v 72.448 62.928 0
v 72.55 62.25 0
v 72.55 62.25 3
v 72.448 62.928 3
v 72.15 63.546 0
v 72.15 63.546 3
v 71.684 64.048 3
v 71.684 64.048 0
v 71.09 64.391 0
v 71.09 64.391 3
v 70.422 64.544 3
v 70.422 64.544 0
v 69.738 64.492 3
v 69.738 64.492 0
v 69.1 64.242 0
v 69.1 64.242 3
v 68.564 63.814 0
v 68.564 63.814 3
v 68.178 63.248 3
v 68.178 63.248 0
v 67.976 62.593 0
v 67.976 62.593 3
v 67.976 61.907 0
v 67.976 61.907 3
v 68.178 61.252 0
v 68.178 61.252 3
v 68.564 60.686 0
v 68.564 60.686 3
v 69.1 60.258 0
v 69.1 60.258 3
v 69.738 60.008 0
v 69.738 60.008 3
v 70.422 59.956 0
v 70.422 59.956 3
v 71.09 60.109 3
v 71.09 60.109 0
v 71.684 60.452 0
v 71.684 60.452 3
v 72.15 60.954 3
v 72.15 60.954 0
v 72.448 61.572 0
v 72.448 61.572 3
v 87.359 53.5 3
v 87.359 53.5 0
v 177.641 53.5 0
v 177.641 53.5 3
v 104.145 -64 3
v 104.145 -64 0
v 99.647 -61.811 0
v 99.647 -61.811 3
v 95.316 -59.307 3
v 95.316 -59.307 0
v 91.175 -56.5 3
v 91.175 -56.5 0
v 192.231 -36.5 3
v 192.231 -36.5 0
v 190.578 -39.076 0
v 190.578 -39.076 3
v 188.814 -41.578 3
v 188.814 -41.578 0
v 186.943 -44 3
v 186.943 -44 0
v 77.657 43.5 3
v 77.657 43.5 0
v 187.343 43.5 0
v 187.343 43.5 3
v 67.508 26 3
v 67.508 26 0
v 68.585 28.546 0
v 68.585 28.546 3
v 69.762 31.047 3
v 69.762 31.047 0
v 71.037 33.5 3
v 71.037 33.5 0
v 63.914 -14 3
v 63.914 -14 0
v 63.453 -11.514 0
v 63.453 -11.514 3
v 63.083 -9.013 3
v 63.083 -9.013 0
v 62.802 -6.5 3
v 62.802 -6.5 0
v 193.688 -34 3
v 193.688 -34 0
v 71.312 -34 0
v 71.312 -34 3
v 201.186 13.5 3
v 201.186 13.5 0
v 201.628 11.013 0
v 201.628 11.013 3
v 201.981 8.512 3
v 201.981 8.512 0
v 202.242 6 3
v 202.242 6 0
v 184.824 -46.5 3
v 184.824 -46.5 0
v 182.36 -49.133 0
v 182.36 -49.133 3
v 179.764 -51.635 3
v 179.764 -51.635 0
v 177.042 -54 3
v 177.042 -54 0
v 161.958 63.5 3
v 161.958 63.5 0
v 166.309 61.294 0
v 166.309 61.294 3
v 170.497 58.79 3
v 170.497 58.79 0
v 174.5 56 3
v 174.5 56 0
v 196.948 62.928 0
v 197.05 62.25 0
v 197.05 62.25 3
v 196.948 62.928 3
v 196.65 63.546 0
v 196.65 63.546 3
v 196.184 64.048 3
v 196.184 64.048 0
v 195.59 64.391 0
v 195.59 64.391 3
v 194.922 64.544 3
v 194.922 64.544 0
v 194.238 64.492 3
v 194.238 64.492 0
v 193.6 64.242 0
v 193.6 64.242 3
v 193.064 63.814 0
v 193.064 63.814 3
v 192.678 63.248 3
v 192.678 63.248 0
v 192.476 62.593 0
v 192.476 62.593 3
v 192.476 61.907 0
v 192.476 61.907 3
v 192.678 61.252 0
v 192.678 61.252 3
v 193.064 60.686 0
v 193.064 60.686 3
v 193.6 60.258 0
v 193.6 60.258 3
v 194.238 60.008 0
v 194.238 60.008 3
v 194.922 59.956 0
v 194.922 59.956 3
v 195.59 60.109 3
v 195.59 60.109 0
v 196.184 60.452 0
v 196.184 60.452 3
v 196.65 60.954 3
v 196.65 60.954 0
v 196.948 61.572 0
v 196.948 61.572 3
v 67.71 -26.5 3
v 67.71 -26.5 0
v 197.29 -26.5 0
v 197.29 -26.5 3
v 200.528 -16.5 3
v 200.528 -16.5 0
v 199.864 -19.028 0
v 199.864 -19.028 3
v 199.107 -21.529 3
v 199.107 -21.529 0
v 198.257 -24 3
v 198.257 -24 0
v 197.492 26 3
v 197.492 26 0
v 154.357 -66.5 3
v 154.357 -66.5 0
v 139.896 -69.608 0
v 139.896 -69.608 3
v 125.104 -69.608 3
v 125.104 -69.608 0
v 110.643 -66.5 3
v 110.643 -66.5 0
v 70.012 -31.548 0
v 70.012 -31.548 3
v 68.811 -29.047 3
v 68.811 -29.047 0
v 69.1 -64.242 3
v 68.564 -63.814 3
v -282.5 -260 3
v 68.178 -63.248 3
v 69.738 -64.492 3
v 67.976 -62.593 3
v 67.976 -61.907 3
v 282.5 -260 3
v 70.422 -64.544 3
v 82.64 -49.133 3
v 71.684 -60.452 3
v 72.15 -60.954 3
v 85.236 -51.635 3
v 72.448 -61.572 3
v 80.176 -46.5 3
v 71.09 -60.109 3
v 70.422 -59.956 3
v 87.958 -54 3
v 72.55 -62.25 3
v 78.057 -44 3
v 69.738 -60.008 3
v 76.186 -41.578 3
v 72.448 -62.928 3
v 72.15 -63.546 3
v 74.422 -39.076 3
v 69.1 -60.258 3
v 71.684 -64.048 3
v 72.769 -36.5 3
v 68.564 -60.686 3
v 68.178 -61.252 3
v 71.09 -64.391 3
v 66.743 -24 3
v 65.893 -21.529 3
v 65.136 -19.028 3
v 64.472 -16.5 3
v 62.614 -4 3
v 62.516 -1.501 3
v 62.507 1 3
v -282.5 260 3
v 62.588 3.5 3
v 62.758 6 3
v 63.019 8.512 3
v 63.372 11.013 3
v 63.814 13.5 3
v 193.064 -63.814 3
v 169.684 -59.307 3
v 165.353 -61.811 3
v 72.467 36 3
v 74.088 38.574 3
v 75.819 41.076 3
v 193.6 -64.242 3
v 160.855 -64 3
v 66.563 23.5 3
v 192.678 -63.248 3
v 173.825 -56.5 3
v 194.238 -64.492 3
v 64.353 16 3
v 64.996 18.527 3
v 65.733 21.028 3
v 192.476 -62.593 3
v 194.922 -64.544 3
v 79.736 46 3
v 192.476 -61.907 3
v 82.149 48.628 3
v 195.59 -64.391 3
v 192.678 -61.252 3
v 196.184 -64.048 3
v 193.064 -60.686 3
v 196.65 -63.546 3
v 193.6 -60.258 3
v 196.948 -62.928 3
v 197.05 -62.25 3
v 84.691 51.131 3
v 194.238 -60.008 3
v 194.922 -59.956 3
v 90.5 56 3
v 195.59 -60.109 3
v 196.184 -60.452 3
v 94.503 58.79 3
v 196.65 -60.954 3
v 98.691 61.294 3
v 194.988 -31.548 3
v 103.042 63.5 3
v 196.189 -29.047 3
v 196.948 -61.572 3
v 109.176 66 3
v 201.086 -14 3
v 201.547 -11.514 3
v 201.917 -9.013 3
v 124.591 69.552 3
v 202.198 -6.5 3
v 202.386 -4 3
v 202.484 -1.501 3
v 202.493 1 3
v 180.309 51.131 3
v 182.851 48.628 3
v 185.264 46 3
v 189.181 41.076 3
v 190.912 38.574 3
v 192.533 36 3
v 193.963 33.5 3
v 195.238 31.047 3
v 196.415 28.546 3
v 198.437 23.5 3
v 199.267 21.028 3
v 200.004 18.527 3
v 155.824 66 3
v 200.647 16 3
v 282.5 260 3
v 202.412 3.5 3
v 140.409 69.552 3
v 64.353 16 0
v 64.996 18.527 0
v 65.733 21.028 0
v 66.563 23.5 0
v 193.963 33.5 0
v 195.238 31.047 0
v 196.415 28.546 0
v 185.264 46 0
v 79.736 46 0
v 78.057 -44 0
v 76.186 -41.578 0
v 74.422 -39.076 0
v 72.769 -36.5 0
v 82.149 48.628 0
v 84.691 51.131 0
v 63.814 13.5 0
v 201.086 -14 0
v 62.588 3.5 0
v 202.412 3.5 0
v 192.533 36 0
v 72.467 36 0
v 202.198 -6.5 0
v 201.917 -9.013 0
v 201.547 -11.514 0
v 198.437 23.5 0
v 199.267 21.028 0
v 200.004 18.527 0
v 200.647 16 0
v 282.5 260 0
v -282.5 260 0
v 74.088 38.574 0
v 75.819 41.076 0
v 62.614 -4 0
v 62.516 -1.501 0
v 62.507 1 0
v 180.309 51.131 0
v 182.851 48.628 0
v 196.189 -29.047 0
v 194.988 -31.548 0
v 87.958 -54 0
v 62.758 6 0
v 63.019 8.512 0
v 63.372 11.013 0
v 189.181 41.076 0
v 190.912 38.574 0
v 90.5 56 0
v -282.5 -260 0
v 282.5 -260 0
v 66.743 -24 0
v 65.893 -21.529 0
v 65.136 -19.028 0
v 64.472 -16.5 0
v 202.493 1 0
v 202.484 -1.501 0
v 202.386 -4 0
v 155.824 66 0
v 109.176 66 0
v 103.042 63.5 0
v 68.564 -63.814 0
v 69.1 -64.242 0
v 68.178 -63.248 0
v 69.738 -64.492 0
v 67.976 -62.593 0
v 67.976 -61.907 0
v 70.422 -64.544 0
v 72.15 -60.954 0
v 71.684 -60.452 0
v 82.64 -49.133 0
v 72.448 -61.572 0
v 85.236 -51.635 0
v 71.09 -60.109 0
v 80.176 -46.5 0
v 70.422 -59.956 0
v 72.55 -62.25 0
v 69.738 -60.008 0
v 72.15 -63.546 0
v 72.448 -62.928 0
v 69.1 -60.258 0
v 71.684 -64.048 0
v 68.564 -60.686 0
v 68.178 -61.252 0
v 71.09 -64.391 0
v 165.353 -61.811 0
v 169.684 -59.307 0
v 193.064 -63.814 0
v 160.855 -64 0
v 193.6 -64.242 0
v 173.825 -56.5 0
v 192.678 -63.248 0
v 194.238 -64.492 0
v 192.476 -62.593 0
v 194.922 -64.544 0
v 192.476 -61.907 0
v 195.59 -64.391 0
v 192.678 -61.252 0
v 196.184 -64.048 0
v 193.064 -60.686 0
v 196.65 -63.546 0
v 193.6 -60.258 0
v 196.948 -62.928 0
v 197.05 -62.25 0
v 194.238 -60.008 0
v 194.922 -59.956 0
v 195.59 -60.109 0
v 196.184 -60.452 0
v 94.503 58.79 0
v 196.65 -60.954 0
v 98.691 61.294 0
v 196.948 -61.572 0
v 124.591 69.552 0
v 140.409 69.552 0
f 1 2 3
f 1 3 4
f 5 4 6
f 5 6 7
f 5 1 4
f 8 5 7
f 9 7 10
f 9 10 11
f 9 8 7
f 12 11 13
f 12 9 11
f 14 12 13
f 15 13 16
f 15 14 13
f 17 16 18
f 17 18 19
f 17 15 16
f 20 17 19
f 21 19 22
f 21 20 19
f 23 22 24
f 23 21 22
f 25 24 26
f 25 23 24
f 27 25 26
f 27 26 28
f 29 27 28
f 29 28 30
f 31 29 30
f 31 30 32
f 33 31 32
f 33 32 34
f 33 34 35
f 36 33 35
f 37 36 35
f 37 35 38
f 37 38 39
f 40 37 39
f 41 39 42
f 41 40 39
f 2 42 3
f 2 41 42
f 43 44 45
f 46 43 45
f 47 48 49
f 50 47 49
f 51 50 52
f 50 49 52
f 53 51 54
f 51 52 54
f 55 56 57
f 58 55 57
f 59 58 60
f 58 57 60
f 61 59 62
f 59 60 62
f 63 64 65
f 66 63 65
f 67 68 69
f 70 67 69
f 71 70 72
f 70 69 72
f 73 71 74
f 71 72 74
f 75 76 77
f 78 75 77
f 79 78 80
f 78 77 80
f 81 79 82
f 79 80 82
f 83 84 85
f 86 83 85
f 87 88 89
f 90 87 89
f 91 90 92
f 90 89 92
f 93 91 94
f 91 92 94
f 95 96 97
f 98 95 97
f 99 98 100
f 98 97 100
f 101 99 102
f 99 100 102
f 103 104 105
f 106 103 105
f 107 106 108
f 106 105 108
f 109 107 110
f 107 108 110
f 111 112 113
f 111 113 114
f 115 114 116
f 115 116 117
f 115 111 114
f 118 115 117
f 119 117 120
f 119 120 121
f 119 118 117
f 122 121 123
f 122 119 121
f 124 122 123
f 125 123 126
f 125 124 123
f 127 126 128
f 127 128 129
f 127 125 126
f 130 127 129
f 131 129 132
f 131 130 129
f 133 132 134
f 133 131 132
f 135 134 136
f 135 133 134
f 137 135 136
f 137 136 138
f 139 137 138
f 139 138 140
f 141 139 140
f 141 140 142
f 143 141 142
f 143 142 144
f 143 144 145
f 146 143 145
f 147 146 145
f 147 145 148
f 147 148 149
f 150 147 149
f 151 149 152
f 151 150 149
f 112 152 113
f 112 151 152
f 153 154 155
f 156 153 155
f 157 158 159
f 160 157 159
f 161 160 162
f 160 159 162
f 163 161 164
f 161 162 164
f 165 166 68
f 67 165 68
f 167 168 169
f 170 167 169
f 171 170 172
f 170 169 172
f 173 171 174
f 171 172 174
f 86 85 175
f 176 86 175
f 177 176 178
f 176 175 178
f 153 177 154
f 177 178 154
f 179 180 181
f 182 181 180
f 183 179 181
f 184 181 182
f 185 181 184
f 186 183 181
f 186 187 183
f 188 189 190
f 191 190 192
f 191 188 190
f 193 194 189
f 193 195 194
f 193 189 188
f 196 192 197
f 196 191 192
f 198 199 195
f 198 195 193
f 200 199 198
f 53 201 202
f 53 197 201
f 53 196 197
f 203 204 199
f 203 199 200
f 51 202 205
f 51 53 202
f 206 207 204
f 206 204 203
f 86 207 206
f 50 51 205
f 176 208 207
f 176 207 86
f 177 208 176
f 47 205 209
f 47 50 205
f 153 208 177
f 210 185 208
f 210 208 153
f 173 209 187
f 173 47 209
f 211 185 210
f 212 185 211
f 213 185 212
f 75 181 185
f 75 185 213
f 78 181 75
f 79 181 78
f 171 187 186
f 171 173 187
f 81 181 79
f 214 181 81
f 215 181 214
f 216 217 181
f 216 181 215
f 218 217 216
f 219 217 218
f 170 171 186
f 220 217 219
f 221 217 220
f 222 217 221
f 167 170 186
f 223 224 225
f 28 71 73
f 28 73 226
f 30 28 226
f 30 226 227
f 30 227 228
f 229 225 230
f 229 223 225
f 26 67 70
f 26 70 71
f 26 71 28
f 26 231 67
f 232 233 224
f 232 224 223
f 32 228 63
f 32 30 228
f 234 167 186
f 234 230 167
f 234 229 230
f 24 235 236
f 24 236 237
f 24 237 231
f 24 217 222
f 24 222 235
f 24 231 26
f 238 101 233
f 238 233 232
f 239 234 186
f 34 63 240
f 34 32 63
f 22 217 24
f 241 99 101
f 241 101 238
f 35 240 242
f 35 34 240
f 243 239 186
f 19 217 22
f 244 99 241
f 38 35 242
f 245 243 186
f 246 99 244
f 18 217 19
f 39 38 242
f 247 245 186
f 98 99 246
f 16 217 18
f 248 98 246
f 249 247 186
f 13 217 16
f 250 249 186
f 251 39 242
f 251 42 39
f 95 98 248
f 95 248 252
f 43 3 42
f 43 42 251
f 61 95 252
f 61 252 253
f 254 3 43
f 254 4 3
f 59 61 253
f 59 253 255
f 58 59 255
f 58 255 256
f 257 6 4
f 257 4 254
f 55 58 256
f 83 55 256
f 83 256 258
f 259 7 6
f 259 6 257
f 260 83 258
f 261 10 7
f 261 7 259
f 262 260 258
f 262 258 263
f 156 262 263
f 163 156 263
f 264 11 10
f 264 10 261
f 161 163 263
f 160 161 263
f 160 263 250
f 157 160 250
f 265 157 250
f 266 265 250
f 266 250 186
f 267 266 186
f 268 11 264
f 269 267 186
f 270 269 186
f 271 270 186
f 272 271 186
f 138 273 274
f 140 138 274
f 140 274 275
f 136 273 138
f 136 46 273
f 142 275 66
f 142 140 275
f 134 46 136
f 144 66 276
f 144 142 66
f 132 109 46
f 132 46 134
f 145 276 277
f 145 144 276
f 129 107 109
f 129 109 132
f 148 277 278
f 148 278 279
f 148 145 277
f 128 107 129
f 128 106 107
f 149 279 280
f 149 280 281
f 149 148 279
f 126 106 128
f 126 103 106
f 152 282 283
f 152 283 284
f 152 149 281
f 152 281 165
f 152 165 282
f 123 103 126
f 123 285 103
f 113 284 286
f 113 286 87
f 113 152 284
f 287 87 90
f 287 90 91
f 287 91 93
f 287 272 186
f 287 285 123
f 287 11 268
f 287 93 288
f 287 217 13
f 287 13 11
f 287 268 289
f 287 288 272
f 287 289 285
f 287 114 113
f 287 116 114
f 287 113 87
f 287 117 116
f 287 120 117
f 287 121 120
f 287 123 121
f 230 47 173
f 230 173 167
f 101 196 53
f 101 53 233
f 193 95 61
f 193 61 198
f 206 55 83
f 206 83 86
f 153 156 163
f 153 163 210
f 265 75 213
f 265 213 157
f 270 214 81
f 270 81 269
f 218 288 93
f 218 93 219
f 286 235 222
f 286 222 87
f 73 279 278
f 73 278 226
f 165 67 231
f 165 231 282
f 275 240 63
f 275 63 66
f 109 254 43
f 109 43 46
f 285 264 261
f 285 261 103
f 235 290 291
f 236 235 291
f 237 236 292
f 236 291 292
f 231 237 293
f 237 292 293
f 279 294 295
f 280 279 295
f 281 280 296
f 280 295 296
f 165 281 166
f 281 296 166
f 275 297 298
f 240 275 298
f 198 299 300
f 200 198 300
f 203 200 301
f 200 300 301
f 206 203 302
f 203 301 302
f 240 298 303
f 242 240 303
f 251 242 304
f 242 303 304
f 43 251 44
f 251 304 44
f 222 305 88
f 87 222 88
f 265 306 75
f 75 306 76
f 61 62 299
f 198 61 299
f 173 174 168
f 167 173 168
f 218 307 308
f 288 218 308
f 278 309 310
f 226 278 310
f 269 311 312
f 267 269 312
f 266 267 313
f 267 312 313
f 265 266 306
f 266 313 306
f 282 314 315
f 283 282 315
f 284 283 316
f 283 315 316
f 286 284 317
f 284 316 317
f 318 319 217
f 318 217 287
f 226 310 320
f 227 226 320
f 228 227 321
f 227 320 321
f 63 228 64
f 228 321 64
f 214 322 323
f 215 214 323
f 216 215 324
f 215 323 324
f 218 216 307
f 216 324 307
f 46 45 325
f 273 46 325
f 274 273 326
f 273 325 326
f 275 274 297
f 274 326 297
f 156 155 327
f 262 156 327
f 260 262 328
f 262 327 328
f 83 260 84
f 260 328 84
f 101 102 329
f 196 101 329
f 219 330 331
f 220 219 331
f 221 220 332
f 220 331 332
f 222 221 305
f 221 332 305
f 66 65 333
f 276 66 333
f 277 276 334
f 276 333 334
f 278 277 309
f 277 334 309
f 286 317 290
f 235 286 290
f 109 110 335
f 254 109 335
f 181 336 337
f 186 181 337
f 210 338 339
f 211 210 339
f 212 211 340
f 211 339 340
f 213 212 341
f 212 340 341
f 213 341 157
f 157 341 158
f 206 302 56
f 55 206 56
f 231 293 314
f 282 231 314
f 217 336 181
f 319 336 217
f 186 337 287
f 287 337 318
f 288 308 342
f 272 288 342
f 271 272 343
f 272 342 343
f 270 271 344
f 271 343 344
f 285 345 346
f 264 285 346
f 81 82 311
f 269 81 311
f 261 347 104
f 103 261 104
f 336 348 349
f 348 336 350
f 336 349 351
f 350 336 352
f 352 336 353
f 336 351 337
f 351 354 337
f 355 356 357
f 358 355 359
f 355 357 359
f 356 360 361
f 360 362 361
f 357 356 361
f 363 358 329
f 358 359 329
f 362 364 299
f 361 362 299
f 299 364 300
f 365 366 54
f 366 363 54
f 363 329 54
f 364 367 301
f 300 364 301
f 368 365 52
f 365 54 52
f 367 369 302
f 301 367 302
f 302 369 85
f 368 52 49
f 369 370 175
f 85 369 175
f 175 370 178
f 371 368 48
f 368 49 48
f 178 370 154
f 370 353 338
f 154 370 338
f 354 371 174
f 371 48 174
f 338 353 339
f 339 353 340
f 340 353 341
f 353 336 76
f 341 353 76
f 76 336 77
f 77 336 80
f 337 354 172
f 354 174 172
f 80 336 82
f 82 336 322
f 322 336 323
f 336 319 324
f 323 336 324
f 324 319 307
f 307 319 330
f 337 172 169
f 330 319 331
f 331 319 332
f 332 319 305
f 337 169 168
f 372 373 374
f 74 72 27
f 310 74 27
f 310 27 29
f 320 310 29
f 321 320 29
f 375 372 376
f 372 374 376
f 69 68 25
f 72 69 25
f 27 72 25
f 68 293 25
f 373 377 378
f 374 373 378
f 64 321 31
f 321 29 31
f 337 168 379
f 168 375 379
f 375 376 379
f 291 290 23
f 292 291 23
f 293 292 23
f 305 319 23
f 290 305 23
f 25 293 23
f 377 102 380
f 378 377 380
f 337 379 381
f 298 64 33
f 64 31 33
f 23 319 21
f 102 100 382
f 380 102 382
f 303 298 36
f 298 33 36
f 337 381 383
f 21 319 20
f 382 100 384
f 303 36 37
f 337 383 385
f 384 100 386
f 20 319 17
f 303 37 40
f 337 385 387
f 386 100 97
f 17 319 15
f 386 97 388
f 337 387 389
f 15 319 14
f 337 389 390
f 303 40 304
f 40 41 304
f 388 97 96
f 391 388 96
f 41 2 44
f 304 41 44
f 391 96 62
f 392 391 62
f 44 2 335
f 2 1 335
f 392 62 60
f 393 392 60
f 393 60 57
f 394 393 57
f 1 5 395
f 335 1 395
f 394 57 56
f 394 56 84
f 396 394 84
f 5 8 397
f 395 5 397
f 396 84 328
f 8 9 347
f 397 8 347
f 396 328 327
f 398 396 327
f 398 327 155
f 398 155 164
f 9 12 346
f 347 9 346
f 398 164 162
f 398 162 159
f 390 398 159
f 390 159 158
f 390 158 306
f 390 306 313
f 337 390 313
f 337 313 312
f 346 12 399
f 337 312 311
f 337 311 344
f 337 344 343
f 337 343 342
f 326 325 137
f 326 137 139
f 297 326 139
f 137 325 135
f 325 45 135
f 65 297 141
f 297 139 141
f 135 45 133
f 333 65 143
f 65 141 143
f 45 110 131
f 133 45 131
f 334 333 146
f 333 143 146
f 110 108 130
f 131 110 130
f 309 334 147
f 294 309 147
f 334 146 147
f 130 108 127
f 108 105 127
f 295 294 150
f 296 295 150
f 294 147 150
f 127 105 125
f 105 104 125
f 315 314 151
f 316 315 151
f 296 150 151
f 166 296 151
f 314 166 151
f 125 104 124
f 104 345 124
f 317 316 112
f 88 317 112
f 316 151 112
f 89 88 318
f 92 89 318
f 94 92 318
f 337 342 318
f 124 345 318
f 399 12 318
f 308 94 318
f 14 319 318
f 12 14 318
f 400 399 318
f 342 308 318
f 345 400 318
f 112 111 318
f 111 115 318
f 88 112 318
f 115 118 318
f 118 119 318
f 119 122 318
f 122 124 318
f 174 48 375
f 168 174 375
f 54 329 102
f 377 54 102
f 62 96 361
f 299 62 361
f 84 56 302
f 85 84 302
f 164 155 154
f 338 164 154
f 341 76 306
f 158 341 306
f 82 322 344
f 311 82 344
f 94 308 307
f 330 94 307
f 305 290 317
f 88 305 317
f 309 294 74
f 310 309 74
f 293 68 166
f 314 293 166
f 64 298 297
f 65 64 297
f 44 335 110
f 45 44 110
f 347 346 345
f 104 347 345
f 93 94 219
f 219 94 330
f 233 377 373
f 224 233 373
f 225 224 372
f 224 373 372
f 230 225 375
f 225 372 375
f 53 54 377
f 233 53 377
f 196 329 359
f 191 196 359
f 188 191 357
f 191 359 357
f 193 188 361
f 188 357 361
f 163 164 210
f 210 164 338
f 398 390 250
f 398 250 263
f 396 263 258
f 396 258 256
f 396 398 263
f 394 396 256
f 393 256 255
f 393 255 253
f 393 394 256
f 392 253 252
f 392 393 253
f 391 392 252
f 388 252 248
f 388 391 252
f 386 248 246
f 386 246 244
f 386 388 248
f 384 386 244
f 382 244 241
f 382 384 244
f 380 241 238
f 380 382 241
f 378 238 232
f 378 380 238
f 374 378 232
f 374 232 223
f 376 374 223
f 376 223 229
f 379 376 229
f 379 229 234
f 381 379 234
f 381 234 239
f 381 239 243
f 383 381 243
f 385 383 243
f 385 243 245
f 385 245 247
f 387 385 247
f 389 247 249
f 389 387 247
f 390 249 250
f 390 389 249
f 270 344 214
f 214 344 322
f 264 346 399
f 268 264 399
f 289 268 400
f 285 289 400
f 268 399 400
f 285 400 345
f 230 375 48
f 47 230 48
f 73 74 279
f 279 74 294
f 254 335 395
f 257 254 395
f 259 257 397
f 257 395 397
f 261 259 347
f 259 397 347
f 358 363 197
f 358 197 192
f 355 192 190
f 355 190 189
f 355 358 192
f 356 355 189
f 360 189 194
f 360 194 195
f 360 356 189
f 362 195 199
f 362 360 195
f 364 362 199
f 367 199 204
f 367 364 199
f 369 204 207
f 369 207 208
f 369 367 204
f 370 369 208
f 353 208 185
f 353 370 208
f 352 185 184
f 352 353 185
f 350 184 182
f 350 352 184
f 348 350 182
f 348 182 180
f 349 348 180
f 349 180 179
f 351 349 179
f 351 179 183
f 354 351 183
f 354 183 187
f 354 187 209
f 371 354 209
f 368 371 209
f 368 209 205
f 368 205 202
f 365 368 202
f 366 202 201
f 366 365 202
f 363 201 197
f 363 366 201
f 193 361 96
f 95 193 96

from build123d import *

# Parameters (mm, degrees)
SKICA1_W                = 565
SKICA1_H                = 520
SKICA1_R                = 2.3
P_IDAT_VYSUNUT_M1_DEPTH = 3


with BuildPart() as part:
    # Skica1 → Přidat vysunutím1 (new body)
    with BuildSketch(Plane.XY):
        Rectangle(SKICA1_W, SKICA1_H)
        with BuildLine():
            Line((177.042114903, -54), (87.957885097, -54))
            ThreePointArc((87.957885097, -54), (83.922227703, -50.400397207), (80.176487121, -46.5))
            Line((80.176487121, -46.5), (184.823512879, -46.5))
            ThreePointArc((184.823512879, -46.5), (181.077772297, -50.400397207), (177.042114903, -54))
        make_face(mode=Mode.SUBTRACT)
        with BuildLine():
            Line((91.175068058, -56.5), (173.824931942, -56.5))
            ThreePointArc((173.824931942, -56.5), (167.541147632, -60.598003042), (160.854893758, -64))
            Line((160.854893758, -64), (104.145106242, -64))
            ThreePointArc((104.145106242, -64), (97.458852368, -60.598003042), (91.175068058, -56.5))
        make_face(mode=Mode.SUBTRACT)
        with BuildLine():
            ThreePointArc((192.230645401, -36.5), (189.709673345, -40.336748453), (186.942630355, -44))
            Line((186.942630355, -44), (78.057369645, -44))
            ThreePointArc((78.057369645, -44), (75.290326655, -40.336748453), (72.769354599, -36.5))
            Line((72.769354599, -36.5), (192.230645401, -36.5))
        make_face(mode=Mode.SUBTRACT)
        with BuildLine():
            ThreePointArc((197.290045532, -26.5), (195.600667498, -30.303560208), (193.688234163, -34))
            Line((193.688234163, -34), (71.311765837, -34))
            ThreePointArc((71.311765837, -34), (69.399332502, -30.303560208), (67.709954468, -26.5))
            Line((67.709954468, -26.5), (197.290045532, -26.5))
        make_face(mode=Mode.SUBTRACT)
        with BuildLine():
            ThreePointArc((200.527567941, -16.5), (199.497378879, -20.281795369), (198.257128891, -24))
            Line((198.257128891, -24), (66.742871109, -24))
            ThreePointArc((66.742871109, -24), (65.502621121, -20.281795369), (64.472432059, -16.5))
            Line((64.472432059, -16.5), (200.527567941, -16.5))
        make_face(mode=Mode.SUBTRACT)
        with BuildLine():
            ThreePointArc((202.197560933, -6.5), (201.743255617, -10.265064616), (201.085712798, -14))
            Line((201.085712798, -14), (63.914287202, -14))
            ThreePointArc((63.914287202, -14), (63.256744383, -10.265064616), (62.802439067, -6.5))
            Line((62.802439067, -6.5), (202.197560933, -6.5))
        make_face(mode=Mode.SUBTRACT)
        with BuildLine():
            Line((202.385620839, -4), (62.614379161, -4))
            ThreePointArc((62.614379161, -4), (62.500447715, -0.250359516), (62.587554756, 3.5))
            Line((62.587554756, 3.5), (202.412445244, 3.5))
            ThreePointArc((202.412445244, 3.5), (202.499552285, -0.250359516), (202.385620839, -4))
        make_face(mode=Mode.SUBTRACT)
        with BuildLine():
            ThreePointArc((201.185879189, 13.5), (201.815643616, 9.764299777), (202.242383097, 6))
            Line((202.242383097, 6), (62.757616903, 6))
            ThreePointArc((62.757616903, 6), (63.184356384, 9.764299777), (63.814120811, 13.5))
            Line((63.814120811, 13.5), (201.185879189, 13.5))
        make_face(mode=Mode.SUBTRACT)
        with BuildLine():
            ThreePointArc((198.437470379, 23.5), (199.646981355, 19.780871947), (200.64690015, 16))
            Line((200.64690015, 16), (64.35309985, 16))
            ThreePointArc((64.35309985, 16), (65.353018645, 19.780871947), (66.562529621, 23.5))
            Line((66.562529621, 23.5), (198.437470379, 23.5))
        make_face(mode=Mode.SUBTRACT)
        with BuildLine():
            ThreePointArc((193.963403746, 33.5), (195.838962812, 29.802278268), (197.492307237, 26))
            Line((197.492307237, 26), (67.507692763, 26))
            ThreePointArc((67.507692763, 26), (69.161037188, 29.802278268), (71.036596254, 33.5))
            Line((71.036596254, 33.5), (193.963403746, 33.5))
        make_face(mode=Mode.SUBTRACT)
        with BuildLine():
            ThreePointArc((187.342957615, 43.5), (190.060424981, 39.834626596), (192.533324079, 36))
            Line((192.533324079, 36), (72.466675921, 36))
            ThreePointArc((72.466675921, 36), (74.939575019, 39.834626596), (77.657042385, 43.5))
            Line((77.657042385, 43.5), (187.342957615, 43.5))
        make_face(mode=Mode.SUBTRACT)
        with BuildLine():
            ThreePointArc((177.641444372, 53.5), (181.595958032, 49.89576039), (185.263623833, 46))
            Line((185.263623833, 46), (79.736376167, 46))
            ThreePointArc((79.736376167, 46), (83.404041968, 49.89576039), (87.358555628, 53.5))
            Line((87.358555628, 53.5), (177.641444372, 53.5))
        make_face(mode=Mode.SUBTRACT)
        with BuildLine():
            ThreePointArc((161.957596643, 63.5), (168.425054342, 60.078202957), (174.5, 56))
            Line((174.5, 56), (90.5, 56))
            ThreePointArc((90.5, 56), (96.574945658, 60.078202957), (103.042403357, 63.5))
            Line((103.042403357, 63.5), (161.957596643, 63.5))
        make_face(mode=Mode.SUBTRACT)
        with Locations((194.75, 62.25)):
            Circle(SKICA1_R, mode=Mode.SUBTRACT)
        with BuildLine():
            ThreePointArc((109.176192421, 66), (132.5, 70), (155.823807579, 66))
            Line((155.823807579, 66), (109.176192421, 66))
        make_face(mode=Mode.SUBTRACT)
        with Locations((70.25, 62.25)):
            Circle(SKICA1_R, mode=Mode.SUBTRACT)
        with Locations((194.75, -62.25)):
            Circle(SKICA1_R, mode=Mode.SUBTRACT)
        with Locations((70.25, -62.25)):
            Circle(SKICA1_R, mode=Mode.SUBTRACT)
        with BuildLine():
            ThreePointArc((154.357492994, -66.5), (132.5, -70), (110.642507006, -66.5))
            Line((110.642507006, -66.5), (154.357492994, -66.5))
        make_face(mode=Mode.SUBTRACT)
    extrude(amount=P_IDAT_VYSUNUT_M1_DEPTH)


solid = part.part
